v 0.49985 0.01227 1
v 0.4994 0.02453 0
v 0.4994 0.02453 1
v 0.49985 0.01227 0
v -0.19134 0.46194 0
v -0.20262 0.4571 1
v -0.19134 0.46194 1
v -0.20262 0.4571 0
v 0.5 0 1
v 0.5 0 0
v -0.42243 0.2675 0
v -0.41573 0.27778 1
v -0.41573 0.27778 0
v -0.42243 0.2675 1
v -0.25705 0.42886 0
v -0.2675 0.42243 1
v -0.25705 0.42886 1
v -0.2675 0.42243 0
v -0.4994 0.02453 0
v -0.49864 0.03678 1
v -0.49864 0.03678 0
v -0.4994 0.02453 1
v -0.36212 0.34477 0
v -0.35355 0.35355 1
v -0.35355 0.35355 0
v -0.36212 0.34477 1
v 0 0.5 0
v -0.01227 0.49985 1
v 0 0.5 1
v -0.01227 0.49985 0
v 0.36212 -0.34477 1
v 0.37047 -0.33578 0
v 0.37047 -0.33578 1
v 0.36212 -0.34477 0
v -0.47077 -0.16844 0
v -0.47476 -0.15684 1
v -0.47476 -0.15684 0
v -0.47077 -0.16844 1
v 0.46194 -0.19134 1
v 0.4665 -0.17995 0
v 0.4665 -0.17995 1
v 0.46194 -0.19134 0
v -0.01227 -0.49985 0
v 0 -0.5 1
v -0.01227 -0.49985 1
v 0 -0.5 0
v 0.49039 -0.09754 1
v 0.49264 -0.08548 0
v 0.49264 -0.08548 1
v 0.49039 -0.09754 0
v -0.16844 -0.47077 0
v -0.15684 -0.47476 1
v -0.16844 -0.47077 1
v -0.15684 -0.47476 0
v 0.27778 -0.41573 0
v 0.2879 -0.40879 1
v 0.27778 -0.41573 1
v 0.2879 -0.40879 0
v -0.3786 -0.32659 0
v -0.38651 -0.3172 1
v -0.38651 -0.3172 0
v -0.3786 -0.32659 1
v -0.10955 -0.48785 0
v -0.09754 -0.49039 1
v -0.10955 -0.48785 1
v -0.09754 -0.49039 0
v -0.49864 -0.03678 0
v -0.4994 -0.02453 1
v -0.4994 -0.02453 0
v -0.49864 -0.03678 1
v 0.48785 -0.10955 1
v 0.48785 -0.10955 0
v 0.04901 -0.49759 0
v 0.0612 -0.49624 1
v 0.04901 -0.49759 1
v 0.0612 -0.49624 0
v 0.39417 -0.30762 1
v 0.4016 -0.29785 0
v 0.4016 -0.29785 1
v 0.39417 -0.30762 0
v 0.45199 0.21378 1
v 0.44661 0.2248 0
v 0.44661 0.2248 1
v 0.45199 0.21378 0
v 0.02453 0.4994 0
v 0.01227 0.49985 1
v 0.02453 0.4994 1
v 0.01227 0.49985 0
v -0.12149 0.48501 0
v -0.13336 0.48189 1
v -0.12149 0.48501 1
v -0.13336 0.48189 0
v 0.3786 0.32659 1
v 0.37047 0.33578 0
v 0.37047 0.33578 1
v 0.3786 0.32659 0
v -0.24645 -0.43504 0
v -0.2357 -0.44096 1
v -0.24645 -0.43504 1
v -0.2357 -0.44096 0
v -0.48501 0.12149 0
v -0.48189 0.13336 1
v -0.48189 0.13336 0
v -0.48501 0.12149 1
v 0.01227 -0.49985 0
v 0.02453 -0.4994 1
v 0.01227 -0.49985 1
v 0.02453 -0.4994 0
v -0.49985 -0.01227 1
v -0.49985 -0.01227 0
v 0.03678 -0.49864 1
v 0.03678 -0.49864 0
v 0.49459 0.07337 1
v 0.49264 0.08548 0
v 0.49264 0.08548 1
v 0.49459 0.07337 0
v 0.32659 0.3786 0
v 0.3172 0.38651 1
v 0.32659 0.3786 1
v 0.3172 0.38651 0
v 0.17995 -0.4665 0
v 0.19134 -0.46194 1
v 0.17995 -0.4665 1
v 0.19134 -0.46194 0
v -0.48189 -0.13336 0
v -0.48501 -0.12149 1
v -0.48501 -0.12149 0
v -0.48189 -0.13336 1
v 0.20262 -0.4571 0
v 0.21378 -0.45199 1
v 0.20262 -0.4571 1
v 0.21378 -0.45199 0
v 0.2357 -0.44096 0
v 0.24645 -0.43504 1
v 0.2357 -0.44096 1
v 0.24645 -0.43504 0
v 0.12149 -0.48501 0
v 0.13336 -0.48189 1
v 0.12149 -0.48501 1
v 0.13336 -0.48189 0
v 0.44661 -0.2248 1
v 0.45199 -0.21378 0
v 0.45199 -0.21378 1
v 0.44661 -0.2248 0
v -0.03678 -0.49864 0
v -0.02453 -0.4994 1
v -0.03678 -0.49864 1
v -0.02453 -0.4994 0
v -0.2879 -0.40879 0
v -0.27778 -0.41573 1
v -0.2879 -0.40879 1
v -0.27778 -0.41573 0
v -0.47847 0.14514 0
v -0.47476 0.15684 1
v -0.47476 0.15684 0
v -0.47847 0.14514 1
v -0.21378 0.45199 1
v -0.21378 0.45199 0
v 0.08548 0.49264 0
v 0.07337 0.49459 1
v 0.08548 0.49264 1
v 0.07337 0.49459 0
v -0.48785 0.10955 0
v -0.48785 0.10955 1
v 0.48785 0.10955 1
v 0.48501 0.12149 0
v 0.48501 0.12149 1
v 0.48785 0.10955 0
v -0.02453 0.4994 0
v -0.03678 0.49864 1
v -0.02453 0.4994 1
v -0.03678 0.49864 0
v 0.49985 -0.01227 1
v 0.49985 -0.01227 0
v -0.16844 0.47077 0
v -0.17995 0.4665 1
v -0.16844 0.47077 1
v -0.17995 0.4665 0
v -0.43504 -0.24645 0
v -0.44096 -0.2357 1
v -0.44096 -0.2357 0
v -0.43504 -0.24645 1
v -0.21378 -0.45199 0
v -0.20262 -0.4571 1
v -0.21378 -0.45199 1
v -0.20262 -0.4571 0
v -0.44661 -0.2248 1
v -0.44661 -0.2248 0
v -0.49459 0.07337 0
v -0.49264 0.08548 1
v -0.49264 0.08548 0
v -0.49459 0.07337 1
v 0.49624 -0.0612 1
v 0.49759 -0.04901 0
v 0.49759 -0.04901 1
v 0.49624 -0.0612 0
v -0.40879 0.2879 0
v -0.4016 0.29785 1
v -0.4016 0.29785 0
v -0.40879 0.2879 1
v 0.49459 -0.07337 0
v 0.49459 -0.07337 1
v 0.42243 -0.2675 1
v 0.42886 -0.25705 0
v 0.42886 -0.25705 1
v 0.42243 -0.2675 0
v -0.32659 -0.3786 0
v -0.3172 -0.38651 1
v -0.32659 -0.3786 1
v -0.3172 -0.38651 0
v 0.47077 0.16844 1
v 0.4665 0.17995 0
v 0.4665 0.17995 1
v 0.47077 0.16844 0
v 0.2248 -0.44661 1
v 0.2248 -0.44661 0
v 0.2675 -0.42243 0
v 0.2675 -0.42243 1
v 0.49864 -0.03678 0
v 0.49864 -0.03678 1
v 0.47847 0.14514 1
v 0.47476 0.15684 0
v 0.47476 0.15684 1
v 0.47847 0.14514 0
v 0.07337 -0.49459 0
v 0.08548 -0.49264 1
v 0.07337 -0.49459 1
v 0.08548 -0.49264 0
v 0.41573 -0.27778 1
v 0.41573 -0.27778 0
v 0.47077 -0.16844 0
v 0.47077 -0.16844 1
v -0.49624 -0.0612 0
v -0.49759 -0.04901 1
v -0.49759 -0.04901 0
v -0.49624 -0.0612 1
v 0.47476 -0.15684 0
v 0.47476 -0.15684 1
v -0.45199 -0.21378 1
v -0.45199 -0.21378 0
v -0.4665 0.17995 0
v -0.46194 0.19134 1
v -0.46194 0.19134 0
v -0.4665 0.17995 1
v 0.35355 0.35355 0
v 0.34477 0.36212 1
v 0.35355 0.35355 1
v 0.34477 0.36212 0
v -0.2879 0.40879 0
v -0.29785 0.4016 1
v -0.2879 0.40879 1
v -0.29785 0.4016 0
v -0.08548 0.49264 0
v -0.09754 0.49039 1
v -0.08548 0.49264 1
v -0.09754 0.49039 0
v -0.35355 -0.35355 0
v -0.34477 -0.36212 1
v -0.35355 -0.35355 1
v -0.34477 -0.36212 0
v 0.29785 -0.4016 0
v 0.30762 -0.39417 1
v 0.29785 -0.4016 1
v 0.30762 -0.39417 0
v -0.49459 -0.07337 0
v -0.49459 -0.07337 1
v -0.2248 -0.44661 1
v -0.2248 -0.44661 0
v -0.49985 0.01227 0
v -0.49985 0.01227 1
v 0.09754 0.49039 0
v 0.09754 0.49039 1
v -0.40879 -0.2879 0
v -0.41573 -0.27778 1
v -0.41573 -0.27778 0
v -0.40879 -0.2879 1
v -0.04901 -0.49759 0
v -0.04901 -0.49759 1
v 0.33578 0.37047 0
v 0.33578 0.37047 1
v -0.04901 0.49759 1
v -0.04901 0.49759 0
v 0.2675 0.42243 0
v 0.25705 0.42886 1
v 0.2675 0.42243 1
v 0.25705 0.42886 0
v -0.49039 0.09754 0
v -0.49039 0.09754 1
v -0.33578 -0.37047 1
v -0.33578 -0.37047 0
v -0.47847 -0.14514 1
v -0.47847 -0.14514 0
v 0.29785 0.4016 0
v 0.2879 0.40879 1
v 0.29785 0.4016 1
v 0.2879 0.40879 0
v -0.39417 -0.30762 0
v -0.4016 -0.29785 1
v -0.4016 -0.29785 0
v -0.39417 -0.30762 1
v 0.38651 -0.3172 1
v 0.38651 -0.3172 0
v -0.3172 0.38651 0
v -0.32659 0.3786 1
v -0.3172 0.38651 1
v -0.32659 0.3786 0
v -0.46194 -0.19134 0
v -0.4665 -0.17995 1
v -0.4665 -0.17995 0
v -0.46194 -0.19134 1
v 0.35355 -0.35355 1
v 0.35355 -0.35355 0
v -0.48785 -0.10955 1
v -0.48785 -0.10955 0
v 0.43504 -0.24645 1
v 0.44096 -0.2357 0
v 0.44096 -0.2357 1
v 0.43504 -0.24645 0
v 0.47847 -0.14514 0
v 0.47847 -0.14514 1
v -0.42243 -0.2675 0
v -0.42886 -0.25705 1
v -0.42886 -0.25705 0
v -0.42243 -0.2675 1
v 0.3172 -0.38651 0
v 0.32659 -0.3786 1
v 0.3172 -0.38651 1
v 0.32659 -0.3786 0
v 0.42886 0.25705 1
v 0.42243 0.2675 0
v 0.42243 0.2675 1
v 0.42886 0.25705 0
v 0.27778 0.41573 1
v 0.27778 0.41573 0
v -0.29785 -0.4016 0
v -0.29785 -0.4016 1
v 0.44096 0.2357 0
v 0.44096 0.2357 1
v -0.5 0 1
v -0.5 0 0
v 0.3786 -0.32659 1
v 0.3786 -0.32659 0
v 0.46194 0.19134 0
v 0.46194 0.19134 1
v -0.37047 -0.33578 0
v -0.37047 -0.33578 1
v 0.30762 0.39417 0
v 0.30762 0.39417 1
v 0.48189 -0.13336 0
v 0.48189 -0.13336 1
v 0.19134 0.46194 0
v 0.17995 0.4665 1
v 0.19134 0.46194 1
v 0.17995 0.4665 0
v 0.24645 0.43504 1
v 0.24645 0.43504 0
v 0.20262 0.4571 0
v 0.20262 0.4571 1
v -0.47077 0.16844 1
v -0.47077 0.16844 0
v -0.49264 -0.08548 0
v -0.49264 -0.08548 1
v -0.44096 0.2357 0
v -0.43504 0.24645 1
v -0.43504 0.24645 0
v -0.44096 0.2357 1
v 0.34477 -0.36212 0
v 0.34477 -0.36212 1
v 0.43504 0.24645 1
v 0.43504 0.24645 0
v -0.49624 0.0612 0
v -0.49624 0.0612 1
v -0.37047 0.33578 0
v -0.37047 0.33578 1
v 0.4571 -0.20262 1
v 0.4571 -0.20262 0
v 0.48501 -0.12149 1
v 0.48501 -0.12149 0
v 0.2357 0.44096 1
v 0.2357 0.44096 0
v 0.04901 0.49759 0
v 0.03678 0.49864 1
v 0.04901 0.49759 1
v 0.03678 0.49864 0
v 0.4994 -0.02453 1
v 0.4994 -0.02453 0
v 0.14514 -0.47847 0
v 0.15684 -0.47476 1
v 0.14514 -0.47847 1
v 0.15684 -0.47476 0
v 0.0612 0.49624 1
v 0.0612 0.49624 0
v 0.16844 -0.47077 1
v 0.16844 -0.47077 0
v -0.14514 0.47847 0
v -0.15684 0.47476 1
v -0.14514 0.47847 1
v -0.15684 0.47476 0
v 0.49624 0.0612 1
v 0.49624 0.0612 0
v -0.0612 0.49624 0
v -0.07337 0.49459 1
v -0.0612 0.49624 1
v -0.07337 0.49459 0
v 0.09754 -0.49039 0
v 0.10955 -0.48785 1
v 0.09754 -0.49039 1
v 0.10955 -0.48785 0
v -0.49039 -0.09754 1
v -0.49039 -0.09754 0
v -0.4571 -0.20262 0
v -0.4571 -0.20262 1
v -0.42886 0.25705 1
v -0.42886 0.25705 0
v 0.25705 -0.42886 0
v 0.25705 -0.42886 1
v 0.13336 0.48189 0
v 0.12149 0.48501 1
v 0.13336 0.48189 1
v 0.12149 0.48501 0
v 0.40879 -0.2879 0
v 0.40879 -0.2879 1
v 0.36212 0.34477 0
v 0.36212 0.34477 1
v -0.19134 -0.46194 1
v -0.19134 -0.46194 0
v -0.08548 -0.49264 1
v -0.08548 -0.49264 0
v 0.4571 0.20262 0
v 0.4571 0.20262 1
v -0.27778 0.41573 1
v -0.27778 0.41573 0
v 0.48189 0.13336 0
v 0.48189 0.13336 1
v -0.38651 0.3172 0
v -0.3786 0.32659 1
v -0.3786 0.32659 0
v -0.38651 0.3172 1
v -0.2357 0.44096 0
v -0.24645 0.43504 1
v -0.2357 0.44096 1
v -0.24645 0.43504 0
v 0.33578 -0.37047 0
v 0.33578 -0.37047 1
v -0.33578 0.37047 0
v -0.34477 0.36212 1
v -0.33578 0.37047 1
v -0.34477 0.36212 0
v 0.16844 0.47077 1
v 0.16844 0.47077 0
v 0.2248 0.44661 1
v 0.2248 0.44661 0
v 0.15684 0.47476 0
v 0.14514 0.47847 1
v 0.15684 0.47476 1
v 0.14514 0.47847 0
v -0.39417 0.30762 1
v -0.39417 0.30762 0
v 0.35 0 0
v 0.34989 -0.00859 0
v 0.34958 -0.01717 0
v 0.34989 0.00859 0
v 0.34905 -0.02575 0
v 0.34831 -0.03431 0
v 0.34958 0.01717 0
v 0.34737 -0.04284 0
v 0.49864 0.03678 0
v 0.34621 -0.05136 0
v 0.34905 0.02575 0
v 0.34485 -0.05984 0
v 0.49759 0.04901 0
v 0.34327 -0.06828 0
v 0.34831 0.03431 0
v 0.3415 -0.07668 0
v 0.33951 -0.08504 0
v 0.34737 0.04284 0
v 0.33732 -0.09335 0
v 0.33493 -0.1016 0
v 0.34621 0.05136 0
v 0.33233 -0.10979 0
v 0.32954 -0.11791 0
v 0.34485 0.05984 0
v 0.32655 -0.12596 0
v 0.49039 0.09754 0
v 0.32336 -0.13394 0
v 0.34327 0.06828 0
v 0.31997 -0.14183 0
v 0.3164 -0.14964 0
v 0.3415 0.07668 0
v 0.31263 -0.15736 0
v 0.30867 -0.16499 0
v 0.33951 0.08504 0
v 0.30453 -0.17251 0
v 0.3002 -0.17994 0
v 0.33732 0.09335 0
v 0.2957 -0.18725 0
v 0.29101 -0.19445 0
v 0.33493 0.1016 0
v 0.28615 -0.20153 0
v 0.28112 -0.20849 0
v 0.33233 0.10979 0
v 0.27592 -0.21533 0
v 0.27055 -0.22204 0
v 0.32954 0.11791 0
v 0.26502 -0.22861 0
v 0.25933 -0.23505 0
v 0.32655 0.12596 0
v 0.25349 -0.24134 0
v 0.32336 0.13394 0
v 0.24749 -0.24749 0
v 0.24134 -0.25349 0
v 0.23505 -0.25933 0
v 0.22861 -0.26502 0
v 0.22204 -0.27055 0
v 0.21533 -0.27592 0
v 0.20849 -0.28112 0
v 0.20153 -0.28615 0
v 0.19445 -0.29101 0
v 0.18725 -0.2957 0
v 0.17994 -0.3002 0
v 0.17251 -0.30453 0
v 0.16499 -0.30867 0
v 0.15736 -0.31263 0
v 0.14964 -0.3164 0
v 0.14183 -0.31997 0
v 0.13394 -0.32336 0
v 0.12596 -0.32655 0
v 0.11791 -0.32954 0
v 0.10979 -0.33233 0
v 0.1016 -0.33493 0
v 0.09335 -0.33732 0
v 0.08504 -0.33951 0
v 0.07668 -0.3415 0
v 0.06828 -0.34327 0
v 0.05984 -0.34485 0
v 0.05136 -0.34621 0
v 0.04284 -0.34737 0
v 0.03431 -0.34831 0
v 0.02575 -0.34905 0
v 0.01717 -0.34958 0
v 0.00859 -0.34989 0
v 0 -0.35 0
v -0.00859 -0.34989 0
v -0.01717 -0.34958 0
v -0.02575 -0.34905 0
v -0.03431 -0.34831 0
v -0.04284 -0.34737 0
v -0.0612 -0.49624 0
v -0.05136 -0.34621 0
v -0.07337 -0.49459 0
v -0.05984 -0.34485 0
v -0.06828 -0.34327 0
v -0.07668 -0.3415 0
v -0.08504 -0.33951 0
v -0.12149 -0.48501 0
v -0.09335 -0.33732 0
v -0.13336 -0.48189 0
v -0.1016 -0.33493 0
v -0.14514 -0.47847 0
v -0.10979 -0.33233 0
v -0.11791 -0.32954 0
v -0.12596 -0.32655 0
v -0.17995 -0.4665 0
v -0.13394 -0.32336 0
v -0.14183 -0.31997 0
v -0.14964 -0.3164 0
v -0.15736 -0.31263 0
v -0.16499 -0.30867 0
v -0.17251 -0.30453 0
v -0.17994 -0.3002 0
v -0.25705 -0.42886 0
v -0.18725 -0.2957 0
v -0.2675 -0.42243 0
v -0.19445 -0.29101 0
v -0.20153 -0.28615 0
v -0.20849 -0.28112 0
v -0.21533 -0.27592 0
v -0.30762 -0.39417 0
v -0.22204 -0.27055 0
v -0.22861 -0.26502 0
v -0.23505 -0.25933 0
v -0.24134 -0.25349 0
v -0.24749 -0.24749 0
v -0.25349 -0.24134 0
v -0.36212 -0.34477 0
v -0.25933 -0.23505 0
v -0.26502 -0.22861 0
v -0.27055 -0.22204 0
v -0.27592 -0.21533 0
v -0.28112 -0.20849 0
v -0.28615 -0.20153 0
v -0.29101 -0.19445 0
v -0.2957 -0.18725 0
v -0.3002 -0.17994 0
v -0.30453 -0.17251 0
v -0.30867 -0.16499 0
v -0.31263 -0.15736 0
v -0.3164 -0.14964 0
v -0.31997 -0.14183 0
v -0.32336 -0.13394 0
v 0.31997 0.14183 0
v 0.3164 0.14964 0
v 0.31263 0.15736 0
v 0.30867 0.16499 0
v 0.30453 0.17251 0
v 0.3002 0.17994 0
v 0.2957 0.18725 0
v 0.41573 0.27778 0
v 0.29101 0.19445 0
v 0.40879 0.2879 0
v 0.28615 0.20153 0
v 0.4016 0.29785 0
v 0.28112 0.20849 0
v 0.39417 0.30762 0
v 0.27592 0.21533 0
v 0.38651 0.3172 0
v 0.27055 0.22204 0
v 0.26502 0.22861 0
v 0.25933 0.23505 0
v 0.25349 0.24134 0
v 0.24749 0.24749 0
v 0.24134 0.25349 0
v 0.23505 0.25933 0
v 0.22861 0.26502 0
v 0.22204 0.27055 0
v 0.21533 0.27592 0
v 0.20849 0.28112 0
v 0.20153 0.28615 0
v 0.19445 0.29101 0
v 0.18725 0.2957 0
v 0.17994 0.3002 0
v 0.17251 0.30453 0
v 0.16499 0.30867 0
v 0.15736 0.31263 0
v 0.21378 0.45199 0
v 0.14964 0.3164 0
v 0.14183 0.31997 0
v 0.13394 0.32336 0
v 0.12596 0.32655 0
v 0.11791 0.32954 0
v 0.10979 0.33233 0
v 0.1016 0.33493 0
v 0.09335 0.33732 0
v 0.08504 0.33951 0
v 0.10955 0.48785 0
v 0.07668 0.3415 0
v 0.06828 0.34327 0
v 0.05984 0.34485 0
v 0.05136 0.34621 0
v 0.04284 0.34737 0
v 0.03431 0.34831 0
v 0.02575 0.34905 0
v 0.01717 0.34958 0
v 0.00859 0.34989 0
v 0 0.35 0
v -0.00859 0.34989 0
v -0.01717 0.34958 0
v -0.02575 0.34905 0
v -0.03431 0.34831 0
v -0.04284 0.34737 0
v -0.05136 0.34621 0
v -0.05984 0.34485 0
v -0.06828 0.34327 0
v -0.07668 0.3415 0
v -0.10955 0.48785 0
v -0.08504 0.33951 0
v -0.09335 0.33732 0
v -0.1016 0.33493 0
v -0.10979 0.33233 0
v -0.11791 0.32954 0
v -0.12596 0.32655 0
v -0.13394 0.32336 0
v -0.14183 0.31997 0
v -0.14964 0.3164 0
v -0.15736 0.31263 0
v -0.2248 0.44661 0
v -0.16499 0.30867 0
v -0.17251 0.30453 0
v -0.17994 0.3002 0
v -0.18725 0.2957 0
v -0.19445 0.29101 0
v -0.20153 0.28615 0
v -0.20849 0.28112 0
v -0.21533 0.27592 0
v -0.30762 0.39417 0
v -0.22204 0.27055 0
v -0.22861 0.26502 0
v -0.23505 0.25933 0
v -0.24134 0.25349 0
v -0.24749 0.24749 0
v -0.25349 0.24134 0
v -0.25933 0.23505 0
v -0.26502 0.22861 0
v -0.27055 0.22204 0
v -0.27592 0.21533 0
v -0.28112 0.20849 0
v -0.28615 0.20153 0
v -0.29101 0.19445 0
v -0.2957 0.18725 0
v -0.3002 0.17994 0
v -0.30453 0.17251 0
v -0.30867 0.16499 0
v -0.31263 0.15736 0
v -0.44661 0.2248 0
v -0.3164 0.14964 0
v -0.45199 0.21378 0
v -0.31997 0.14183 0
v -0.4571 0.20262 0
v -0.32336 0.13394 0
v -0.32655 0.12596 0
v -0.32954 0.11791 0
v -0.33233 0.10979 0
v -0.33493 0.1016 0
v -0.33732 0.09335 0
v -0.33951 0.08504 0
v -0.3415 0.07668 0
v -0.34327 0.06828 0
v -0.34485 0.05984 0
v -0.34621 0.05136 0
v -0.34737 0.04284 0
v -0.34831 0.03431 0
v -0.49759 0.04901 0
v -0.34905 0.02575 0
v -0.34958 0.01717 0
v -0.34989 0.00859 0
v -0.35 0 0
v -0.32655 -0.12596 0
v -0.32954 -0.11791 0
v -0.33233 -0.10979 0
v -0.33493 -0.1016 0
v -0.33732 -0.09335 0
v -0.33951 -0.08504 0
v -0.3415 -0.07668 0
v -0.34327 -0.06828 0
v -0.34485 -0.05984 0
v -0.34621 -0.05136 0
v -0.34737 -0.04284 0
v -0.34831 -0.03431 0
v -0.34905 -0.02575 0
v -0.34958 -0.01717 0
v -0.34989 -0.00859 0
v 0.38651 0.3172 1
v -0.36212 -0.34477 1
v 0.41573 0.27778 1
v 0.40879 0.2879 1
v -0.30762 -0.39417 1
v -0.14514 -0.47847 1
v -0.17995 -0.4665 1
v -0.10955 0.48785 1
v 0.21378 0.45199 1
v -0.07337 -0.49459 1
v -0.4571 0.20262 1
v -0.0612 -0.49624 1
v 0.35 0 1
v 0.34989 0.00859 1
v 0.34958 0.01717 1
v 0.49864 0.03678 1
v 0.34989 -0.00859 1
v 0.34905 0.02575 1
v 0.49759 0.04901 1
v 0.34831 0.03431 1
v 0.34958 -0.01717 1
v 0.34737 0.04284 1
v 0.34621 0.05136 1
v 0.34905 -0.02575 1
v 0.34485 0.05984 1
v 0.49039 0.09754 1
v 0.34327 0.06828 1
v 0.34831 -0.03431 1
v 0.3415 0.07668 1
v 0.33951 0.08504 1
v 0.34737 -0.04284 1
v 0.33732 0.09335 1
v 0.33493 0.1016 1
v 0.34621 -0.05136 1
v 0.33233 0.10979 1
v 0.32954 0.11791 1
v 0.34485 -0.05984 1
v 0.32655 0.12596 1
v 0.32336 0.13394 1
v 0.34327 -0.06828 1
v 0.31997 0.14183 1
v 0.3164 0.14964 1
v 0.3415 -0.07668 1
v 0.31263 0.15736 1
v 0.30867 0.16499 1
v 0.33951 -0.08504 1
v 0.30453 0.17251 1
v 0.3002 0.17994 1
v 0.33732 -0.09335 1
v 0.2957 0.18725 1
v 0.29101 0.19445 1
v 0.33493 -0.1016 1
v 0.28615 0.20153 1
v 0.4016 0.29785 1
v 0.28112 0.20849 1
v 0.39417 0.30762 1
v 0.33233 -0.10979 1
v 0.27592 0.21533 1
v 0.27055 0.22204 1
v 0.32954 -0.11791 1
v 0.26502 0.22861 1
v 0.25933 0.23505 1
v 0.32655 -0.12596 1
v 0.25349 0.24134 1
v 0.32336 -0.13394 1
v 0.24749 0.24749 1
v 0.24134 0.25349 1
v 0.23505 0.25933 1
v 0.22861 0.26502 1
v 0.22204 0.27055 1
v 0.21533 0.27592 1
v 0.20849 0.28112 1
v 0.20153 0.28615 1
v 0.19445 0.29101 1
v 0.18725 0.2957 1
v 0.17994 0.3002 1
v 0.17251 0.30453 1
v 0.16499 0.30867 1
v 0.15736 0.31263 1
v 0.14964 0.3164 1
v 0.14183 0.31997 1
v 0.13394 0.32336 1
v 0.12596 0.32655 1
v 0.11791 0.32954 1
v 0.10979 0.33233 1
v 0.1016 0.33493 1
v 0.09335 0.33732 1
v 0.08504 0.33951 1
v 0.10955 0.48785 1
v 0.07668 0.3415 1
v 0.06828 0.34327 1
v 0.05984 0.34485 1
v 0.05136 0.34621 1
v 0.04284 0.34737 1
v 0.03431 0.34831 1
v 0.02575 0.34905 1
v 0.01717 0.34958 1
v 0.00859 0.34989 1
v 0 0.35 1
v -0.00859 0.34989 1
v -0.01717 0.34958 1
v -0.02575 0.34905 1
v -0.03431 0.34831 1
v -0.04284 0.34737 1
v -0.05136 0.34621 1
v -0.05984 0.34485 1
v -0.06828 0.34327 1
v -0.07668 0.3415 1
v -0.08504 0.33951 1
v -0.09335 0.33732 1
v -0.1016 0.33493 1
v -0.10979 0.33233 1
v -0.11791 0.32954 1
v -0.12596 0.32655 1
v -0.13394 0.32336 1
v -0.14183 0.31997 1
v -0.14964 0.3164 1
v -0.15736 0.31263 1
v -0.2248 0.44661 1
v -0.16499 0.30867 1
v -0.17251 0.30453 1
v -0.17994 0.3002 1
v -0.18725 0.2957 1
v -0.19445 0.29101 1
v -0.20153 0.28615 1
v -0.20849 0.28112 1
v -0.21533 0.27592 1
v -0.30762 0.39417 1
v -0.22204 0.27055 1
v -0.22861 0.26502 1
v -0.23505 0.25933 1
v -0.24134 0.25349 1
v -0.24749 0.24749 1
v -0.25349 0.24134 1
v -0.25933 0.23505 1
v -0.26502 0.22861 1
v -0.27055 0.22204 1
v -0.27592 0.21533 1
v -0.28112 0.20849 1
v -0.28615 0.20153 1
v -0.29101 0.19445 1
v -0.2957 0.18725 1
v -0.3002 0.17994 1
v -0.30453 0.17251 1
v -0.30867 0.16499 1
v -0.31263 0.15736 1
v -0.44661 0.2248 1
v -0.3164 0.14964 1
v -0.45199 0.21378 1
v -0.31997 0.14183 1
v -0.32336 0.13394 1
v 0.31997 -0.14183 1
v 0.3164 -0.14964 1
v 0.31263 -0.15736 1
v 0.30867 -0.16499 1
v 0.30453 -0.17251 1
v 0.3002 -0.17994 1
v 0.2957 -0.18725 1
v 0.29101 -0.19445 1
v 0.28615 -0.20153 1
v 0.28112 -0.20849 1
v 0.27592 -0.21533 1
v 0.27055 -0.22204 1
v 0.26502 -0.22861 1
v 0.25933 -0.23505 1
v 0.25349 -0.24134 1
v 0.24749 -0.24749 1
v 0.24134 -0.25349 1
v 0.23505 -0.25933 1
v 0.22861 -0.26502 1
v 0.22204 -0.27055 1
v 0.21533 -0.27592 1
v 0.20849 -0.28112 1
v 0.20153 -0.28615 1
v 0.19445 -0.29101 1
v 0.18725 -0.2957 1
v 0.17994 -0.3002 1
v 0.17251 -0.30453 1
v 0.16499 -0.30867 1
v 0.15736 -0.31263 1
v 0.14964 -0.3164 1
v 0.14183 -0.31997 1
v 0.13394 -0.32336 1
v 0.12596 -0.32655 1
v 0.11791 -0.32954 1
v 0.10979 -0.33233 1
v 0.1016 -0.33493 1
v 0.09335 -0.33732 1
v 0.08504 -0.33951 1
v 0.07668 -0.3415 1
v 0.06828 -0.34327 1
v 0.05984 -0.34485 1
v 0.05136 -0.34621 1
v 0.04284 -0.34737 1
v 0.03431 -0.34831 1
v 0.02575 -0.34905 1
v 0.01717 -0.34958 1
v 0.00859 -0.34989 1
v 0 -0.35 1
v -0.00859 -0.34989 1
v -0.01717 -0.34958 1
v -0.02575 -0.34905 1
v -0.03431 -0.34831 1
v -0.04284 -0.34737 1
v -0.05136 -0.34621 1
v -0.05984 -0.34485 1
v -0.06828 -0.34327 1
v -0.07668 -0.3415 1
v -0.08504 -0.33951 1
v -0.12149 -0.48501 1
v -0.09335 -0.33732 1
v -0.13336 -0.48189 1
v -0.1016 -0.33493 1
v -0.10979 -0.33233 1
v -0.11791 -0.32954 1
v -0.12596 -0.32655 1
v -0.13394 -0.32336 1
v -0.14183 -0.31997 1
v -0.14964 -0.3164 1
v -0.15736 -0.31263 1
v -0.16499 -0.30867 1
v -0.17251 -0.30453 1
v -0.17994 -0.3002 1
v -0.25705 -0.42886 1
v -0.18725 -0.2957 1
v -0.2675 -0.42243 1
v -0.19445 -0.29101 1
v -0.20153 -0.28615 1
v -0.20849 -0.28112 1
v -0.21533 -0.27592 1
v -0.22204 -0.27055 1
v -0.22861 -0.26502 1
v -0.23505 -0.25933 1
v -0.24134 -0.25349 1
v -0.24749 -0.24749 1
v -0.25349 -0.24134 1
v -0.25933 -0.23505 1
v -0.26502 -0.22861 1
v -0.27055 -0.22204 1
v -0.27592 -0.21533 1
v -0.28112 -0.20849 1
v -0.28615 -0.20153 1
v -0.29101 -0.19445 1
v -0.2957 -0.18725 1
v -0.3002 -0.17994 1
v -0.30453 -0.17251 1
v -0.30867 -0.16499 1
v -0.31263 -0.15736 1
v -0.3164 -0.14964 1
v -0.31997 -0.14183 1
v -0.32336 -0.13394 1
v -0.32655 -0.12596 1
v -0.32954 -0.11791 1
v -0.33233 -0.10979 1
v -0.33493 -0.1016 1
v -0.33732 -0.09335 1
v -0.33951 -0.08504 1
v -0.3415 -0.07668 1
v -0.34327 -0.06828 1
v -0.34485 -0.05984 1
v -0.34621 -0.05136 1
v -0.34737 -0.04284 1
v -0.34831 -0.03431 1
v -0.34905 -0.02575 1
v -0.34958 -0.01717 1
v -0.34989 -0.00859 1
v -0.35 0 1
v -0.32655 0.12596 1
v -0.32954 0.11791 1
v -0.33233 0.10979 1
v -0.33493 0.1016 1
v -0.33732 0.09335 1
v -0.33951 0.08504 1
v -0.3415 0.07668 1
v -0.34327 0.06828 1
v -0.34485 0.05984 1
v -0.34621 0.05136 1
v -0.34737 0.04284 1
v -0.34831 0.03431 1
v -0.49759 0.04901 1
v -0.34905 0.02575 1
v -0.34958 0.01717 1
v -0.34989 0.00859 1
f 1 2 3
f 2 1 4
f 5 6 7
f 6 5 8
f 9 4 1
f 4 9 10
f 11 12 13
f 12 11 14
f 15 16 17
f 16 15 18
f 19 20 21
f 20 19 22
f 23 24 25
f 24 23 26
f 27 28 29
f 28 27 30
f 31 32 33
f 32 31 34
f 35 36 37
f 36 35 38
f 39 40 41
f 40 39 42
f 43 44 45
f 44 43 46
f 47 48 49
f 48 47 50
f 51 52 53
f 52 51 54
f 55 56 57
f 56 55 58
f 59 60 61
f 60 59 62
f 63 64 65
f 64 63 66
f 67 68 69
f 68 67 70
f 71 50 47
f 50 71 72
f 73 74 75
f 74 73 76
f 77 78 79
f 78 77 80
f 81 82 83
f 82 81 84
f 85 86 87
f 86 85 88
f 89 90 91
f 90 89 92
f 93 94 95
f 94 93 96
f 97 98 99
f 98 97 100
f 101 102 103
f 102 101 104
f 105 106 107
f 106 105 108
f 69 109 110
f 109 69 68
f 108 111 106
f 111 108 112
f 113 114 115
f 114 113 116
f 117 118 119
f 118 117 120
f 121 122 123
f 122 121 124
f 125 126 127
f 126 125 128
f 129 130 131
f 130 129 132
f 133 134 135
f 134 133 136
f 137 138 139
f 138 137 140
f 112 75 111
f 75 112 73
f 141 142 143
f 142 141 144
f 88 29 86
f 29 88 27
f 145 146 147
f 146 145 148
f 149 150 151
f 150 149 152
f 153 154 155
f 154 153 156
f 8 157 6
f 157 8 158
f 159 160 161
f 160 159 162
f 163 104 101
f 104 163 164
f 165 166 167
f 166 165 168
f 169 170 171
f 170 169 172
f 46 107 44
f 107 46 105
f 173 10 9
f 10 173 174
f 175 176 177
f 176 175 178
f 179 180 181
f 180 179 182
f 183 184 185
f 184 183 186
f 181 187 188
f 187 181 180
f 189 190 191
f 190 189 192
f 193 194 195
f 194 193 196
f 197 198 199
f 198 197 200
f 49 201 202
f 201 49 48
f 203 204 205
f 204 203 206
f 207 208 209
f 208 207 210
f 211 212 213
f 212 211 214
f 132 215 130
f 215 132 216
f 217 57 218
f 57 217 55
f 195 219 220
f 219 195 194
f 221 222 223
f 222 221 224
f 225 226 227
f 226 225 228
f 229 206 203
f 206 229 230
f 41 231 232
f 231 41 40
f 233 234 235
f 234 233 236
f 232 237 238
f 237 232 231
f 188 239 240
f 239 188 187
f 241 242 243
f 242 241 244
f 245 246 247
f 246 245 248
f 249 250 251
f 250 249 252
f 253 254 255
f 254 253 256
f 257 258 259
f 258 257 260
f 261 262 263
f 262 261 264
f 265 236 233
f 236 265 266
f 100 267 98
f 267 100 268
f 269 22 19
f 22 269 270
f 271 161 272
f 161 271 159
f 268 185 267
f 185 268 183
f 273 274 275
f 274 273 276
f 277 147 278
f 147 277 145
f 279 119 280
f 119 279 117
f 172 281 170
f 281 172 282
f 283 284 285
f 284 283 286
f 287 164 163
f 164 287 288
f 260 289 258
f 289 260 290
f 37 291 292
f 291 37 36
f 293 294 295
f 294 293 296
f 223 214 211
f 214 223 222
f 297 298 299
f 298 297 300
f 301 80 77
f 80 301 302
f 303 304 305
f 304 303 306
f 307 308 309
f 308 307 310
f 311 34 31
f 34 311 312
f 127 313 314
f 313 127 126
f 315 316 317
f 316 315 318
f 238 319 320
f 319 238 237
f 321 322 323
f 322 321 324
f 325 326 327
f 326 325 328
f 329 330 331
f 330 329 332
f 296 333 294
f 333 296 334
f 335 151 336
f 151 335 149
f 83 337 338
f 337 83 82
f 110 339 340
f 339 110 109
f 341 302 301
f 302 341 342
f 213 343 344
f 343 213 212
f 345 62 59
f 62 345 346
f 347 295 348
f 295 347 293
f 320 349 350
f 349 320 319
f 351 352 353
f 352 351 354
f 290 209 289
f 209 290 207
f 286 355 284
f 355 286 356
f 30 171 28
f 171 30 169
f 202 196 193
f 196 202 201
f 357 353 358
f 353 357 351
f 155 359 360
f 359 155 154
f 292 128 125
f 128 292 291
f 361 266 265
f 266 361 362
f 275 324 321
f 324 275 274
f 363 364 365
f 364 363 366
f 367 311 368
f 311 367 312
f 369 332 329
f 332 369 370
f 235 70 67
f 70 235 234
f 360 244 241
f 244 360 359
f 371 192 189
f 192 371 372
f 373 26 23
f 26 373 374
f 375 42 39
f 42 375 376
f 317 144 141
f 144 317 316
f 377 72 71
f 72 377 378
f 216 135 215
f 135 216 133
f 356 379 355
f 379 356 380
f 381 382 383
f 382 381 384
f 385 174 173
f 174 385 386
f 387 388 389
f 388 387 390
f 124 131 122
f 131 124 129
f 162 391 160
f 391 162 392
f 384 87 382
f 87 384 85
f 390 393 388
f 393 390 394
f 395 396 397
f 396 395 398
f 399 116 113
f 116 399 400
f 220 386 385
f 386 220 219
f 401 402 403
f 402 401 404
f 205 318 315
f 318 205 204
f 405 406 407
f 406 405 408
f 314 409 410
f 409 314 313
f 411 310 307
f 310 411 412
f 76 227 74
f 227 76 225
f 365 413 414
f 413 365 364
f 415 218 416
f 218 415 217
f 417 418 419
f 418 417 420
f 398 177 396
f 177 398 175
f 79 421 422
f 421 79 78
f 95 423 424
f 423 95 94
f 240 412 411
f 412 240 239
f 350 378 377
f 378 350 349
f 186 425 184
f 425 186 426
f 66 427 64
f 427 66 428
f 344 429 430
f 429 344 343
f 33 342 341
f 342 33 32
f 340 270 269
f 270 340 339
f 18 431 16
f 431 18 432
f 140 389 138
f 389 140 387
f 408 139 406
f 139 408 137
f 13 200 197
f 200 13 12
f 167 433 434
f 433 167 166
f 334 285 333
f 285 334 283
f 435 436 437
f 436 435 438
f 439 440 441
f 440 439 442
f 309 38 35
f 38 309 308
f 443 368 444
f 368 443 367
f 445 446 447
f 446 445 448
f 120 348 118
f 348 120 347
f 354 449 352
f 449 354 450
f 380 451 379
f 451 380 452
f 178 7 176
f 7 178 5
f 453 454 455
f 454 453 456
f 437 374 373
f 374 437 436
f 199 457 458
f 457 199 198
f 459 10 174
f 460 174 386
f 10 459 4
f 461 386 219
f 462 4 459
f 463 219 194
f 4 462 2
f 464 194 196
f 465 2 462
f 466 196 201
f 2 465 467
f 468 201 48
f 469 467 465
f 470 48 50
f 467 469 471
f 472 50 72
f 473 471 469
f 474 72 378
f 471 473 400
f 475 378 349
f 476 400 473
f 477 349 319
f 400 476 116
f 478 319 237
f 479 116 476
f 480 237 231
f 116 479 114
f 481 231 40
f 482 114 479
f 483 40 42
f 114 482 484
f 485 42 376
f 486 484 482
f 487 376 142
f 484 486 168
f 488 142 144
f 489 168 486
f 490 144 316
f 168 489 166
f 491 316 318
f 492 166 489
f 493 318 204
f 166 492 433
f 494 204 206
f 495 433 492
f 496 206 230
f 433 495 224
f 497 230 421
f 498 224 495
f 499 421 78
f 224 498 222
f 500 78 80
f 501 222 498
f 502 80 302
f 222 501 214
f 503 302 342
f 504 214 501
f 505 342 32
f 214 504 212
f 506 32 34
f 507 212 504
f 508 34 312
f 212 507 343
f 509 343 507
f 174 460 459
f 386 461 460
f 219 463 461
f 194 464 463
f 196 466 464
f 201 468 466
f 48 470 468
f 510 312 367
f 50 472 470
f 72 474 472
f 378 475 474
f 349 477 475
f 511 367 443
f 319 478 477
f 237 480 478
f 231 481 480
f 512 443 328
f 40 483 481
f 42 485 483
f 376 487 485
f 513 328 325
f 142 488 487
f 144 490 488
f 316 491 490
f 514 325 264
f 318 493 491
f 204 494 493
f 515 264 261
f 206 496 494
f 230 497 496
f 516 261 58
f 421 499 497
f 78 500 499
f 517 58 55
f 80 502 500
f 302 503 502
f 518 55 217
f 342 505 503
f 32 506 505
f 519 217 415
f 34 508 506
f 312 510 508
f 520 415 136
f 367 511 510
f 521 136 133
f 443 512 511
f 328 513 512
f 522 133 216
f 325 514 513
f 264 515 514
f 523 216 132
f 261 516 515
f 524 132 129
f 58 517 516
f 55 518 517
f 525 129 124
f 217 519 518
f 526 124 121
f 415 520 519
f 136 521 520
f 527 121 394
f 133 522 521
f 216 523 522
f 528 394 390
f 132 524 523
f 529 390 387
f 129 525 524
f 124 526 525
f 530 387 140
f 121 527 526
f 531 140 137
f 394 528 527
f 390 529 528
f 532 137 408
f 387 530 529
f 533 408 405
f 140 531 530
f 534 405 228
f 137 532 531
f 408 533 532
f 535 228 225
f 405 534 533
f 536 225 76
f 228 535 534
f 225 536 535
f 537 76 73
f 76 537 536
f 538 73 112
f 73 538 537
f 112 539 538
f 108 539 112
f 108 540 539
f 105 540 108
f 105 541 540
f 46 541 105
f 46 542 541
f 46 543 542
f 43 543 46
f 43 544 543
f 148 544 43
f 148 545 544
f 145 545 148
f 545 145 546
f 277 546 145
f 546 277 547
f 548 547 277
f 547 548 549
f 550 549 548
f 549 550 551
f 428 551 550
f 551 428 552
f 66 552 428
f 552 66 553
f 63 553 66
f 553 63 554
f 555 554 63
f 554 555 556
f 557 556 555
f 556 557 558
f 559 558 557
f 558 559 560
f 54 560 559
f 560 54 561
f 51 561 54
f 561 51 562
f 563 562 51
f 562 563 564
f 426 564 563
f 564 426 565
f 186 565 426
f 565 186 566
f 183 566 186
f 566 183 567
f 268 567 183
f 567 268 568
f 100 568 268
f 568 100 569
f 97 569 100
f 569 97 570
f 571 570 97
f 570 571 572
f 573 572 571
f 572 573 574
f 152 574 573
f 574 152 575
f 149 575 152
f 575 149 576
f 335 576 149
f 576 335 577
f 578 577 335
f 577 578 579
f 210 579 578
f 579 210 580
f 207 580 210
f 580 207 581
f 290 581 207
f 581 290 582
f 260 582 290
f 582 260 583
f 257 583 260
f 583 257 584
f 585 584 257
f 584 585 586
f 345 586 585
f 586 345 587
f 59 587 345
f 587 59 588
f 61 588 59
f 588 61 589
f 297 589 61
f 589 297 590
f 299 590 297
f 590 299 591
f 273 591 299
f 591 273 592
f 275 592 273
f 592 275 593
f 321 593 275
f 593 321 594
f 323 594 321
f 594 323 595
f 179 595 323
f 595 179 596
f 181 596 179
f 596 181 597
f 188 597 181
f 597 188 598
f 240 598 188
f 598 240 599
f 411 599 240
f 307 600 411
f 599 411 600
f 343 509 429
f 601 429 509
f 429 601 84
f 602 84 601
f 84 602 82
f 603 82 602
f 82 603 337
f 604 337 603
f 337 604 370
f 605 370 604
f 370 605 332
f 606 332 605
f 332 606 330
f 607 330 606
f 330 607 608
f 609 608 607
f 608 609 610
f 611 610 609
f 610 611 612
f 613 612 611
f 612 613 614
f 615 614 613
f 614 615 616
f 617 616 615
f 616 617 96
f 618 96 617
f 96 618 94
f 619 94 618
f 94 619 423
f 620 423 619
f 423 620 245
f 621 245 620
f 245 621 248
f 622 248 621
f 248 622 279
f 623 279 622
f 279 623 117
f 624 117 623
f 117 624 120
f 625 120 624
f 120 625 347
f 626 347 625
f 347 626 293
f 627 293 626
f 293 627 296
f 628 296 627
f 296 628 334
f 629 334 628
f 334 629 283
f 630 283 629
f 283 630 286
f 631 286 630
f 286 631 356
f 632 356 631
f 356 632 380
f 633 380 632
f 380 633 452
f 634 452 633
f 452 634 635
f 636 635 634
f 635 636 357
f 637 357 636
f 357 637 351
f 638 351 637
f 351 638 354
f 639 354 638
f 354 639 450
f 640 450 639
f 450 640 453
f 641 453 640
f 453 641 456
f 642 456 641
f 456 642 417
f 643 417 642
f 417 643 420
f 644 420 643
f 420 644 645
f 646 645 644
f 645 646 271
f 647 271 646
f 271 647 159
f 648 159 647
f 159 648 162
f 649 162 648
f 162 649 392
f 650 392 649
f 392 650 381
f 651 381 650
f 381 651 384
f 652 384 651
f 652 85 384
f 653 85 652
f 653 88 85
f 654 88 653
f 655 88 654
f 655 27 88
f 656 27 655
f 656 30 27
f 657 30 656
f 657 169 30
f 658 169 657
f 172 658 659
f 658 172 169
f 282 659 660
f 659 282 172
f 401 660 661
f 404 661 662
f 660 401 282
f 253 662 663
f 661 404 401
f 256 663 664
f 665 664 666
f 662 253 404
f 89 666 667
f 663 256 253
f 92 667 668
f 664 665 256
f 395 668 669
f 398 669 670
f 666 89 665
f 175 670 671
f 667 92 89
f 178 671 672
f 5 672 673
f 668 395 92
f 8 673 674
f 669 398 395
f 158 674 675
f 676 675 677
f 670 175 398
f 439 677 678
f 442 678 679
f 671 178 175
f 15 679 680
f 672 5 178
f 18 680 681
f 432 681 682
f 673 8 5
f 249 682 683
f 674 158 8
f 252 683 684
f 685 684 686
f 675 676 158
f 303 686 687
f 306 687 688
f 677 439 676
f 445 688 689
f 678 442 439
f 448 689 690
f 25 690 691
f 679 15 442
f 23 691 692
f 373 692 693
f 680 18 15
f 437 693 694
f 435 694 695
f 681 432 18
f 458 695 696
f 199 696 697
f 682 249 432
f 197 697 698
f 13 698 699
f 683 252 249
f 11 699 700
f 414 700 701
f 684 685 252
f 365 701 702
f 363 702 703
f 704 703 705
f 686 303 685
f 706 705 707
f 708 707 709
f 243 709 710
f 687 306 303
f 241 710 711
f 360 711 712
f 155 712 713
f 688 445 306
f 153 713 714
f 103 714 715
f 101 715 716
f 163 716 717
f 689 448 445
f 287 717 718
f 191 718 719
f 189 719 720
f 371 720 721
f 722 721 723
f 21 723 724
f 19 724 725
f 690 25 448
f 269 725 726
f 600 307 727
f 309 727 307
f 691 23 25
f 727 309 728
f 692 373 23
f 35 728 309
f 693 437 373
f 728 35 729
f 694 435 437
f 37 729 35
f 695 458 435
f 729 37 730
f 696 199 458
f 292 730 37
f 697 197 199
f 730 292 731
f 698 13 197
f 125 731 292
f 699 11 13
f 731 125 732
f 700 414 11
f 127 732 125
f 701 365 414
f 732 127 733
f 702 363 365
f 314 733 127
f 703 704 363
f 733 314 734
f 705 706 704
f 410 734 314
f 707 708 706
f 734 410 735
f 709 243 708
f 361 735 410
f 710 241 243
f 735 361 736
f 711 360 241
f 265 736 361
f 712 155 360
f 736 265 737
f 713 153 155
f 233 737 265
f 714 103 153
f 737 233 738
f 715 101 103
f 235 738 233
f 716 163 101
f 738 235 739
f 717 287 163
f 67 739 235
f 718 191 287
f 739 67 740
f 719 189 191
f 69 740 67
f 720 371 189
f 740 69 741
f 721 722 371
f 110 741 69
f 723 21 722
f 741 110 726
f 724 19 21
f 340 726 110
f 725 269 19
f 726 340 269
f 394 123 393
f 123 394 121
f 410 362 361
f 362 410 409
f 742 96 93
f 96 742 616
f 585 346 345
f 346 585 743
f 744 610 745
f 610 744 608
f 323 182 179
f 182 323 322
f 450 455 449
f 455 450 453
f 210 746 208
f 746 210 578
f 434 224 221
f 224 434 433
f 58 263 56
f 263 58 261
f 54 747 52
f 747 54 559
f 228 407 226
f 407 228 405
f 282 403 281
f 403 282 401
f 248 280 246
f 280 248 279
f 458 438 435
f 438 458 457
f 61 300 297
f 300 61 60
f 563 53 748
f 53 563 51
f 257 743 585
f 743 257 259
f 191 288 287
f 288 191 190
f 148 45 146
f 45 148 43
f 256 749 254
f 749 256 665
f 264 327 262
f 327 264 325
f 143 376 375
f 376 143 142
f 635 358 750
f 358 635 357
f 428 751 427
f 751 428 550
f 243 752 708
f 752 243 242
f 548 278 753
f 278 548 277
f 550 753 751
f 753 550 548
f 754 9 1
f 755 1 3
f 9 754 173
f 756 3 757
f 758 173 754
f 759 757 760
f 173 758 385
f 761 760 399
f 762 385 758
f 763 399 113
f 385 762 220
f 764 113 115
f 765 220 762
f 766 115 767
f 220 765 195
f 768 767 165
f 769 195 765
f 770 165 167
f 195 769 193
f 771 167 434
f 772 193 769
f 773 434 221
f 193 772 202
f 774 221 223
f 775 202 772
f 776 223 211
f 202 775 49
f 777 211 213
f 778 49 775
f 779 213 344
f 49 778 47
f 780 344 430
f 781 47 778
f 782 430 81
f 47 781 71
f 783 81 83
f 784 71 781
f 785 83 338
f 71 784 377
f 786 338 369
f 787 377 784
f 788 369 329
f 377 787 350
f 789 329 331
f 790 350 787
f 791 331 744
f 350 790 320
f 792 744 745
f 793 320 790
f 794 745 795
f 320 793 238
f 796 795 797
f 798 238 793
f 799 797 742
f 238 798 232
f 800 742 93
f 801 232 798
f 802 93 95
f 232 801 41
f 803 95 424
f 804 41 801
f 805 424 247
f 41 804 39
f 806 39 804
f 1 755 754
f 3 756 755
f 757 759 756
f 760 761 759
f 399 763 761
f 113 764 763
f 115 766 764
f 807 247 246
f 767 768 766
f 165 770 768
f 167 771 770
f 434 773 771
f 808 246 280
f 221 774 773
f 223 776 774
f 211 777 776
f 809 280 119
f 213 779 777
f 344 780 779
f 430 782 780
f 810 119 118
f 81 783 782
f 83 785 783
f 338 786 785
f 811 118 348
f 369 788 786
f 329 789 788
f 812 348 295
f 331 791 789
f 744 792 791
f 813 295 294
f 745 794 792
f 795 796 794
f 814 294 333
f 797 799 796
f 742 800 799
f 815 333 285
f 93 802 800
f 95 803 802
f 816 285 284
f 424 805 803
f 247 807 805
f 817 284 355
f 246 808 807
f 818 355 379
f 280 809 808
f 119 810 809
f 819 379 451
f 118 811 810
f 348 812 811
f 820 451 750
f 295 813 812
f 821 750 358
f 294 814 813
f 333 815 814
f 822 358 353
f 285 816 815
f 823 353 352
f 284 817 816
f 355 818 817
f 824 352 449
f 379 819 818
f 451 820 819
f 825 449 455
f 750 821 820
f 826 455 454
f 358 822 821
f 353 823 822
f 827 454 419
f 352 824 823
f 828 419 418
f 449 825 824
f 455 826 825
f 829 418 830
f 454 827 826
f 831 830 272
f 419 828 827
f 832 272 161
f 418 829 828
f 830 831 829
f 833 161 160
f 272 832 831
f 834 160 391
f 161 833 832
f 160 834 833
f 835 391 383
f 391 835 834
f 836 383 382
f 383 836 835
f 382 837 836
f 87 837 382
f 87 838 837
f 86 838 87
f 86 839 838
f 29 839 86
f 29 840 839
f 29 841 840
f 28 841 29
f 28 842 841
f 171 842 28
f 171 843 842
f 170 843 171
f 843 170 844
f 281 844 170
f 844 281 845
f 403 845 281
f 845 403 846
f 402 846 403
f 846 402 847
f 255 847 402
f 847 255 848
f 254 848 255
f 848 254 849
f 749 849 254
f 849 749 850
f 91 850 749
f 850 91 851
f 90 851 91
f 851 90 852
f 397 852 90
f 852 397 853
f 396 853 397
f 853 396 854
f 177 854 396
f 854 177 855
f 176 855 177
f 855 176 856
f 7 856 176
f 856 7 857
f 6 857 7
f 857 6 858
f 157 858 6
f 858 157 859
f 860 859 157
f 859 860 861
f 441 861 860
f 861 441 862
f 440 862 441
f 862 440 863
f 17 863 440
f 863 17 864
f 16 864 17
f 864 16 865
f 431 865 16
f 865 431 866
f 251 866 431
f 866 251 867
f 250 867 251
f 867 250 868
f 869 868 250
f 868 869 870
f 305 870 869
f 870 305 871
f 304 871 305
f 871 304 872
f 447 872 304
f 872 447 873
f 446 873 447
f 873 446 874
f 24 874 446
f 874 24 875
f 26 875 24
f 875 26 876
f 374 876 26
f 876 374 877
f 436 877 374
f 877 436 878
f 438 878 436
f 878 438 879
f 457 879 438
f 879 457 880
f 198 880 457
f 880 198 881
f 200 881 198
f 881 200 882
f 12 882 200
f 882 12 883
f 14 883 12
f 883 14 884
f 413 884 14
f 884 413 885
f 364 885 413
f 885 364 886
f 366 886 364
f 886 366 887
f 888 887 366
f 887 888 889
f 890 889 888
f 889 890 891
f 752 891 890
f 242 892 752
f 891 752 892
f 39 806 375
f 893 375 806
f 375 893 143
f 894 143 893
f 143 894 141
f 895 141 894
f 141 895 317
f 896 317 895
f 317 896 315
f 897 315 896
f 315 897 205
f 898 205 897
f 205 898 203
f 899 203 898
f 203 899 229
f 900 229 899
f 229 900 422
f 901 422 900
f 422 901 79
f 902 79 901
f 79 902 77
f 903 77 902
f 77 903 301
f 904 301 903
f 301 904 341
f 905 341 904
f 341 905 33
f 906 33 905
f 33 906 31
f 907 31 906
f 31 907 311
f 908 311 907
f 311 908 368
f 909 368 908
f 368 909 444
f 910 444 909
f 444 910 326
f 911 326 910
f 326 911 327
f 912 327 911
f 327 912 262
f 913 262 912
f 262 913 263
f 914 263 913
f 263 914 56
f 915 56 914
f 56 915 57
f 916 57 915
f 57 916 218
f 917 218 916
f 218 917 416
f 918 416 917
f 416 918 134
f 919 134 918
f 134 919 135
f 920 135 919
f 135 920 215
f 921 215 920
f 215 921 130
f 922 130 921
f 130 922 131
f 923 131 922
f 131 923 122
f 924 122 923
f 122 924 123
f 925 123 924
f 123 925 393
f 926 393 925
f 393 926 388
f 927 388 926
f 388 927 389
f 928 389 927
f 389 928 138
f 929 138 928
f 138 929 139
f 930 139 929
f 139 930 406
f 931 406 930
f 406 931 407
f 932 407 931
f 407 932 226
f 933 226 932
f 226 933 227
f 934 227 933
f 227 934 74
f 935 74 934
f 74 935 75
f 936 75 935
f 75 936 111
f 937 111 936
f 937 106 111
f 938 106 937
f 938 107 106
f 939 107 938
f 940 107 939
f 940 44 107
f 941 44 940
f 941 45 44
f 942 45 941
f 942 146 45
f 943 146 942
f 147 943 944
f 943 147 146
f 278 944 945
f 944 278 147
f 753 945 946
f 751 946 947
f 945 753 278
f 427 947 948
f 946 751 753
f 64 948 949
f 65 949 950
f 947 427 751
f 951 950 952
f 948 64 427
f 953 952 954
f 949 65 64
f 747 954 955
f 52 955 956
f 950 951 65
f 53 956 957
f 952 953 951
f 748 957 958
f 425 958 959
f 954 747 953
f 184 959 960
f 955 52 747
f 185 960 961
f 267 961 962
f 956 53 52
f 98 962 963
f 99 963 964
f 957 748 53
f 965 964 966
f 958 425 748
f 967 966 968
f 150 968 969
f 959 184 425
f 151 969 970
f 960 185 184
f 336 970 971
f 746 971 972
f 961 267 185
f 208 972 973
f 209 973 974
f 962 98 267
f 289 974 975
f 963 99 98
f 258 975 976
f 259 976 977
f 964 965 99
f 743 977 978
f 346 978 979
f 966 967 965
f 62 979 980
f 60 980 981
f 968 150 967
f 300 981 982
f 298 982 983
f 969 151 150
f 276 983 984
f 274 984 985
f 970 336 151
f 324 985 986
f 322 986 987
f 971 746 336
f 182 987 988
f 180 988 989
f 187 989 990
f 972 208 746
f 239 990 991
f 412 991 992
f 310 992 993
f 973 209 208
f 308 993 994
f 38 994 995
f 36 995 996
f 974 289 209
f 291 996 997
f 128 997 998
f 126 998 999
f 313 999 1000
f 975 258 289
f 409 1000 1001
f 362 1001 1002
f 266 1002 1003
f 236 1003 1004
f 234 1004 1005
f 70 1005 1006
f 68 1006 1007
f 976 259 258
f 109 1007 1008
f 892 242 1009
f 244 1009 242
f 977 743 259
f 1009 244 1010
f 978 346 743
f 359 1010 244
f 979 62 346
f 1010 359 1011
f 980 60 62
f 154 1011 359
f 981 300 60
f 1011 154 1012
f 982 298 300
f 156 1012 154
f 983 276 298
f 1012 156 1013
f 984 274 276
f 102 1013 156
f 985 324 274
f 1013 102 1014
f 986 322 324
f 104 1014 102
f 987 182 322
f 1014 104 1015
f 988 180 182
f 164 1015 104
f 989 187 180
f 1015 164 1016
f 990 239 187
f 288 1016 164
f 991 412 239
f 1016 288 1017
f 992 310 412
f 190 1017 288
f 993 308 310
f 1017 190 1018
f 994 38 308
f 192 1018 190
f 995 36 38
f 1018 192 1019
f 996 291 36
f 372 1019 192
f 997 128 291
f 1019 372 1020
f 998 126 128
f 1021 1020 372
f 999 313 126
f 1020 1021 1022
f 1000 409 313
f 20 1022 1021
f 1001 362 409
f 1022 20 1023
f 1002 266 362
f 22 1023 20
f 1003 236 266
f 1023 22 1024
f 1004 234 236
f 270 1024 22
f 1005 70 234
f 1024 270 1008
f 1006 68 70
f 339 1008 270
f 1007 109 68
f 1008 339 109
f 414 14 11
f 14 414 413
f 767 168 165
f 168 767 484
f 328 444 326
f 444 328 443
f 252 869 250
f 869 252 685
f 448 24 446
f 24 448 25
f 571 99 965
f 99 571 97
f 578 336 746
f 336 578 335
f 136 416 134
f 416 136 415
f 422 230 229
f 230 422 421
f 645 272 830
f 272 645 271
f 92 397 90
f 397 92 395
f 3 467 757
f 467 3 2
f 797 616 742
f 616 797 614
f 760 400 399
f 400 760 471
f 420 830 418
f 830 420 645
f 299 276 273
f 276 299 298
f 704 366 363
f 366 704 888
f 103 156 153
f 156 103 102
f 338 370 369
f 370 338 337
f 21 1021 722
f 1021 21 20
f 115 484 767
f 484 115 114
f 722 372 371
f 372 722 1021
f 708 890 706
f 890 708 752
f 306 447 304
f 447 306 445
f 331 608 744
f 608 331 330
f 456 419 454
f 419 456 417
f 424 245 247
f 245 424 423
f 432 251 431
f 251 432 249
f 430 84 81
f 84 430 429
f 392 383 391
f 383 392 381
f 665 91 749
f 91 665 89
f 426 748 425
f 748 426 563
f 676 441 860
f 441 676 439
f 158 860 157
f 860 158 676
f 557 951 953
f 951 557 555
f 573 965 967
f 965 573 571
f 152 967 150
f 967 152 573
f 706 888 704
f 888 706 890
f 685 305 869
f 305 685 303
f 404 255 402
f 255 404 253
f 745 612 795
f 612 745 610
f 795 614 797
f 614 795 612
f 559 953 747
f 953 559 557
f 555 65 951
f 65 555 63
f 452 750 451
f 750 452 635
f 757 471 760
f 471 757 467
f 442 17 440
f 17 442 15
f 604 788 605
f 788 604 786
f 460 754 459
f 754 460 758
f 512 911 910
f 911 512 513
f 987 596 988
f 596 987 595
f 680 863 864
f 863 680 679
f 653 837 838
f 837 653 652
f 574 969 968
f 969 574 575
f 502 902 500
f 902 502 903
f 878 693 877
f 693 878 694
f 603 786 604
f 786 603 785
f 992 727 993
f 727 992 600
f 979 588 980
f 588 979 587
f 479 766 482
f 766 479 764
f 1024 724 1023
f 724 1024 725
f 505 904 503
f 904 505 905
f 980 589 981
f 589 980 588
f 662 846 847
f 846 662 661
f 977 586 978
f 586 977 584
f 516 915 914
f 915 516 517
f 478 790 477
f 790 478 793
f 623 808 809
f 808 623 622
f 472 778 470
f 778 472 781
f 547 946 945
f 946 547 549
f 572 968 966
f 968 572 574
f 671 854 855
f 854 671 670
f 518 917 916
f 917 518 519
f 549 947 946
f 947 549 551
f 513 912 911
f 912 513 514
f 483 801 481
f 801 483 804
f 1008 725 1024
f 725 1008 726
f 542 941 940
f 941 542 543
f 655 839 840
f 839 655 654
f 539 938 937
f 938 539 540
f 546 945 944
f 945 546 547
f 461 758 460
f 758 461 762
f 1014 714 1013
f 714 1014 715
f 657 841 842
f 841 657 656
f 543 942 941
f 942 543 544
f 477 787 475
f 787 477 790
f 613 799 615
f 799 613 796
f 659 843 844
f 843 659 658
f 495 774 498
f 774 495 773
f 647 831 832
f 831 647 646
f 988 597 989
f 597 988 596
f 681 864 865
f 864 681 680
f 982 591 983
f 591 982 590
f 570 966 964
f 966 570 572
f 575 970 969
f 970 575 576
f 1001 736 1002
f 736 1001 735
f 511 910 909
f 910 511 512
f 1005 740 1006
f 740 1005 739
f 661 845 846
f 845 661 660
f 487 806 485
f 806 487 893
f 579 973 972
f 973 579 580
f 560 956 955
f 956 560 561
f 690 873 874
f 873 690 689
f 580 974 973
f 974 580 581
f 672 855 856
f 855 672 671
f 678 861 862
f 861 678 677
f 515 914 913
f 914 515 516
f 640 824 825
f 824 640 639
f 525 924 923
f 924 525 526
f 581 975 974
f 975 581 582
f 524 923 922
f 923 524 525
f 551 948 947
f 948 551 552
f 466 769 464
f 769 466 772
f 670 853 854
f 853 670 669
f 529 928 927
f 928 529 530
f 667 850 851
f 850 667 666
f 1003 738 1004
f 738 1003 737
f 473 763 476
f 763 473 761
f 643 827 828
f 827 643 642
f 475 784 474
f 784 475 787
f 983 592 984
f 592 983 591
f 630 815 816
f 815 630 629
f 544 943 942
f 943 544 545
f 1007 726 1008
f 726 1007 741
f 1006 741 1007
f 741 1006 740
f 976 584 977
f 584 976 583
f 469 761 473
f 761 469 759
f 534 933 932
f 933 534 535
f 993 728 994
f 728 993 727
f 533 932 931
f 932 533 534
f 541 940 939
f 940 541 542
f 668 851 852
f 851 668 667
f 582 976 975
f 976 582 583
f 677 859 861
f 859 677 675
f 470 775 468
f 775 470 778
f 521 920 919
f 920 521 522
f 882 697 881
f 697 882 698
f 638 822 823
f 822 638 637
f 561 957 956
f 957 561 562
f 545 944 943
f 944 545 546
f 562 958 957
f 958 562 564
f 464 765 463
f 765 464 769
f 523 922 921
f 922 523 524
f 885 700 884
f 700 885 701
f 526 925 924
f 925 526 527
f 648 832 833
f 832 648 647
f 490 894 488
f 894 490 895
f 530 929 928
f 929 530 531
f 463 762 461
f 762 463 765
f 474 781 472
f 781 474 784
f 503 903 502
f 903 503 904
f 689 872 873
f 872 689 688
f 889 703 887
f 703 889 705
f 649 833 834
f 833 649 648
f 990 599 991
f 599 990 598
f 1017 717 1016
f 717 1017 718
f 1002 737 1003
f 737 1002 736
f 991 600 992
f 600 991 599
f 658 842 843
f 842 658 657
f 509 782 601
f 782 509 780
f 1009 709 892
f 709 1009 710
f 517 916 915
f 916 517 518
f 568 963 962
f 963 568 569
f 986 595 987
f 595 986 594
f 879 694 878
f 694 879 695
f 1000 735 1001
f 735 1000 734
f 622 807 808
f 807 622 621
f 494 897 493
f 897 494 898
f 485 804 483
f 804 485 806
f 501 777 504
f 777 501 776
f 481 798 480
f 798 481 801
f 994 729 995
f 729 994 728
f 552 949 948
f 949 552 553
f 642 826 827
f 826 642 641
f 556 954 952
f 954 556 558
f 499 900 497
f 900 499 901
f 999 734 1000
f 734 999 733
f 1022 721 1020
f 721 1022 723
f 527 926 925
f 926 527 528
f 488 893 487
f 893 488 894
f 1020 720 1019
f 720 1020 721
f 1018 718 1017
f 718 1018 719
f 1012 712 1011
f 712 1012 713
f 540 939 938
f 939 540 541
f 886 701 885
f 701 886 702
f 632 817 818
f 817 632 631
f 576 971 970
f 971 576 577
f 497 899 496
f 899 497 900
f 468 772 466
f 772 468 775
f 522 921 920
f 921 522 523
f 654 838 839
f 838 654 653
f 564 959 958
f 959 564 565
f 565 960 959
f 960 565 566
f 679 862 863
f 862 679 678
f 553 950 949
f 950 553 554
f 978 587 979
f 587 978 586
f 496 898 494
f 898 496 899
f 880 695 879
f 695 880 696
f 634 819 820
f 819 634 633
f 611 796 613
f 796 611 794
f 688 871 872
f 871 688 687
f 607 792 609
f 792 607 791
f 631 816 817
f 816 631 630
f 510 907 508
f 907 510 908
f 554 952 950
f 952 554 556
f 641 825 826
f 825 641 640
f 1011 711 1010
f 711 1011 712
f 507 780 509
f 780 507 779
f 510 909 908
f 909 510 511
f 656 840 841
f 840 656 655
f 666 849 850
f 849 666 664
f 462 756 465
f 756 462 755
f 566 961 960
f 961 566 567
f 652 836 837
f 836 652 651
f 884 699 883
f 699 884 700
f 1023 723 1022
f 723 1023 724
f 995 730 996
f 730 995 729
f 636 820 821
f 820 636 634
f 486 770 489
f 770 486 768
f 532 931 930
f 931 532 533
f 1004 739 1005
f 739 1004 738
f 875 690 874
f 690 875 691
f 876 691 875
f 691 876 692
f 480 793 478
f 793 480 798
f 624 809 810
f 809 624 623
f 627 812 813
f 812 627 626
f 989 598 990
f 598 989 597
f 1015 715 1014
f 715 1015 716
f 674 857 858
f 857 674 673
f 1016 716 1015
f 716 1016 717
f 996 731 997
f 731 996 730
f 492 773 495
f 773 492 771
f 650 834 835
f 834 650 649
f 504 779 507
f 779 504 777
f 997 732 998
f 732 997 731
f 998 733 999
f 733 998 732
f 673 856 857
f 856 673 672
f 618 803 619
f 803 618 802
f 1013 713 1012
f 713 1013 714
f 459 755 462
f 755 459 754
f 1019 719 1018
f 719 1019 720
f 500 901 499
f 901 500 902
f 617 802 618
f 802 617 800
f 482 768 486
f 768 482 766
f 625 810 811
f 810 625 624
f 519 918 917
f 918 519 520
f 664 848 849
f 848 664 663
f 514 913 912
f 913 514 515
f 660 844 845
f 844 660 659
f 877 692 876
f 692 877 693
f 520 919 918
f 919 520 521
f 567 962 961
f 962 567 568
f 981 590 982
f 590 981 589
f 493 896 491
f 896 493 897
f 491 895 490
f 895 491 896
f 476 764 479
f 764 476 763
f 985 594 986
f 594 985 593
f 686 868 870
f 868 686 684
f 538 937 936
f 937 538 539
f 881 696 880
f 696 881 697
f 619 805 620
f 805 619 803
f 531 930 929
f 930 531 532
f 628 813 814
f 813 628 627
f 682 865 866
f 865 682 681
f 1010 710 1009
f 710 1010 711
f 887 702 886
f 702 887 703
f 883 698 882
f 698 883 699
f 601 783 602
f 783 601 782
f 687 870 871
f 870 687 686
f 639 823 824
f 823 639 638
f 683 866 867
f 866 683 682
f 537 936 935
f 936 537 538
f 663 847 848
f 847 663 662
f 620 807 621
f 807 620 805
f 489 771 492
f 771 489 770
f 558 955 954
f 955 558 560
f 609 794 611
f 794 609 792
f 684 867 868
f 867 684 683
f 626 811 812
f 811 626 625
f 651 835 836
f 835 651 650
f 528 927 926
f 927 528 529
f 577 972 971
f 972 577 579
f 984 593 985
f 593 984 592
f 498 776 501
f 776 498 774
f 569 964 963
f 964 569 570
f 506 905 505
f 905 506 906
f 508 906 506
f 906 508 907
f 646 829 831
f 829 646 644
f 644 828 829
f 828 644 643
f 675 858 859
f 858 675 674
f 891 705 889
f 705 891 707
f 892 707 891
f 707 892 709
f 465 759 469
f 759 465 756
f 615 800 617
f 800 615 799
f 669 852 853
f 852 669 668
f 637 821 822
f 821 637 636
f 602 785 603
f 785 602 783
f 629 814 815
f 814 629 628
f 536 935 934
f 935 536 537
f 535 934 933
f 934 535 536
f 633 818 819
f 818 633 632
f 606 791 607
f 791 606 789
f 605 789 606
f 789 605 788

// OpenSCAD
// Tube for Basic Shapes
// by Slashee the Cow
$fn = 256;

difference(){
    linear_extrude(1)
        circle(d=1);
    linear_extrude(1)
        circle(d=0.7);
}
